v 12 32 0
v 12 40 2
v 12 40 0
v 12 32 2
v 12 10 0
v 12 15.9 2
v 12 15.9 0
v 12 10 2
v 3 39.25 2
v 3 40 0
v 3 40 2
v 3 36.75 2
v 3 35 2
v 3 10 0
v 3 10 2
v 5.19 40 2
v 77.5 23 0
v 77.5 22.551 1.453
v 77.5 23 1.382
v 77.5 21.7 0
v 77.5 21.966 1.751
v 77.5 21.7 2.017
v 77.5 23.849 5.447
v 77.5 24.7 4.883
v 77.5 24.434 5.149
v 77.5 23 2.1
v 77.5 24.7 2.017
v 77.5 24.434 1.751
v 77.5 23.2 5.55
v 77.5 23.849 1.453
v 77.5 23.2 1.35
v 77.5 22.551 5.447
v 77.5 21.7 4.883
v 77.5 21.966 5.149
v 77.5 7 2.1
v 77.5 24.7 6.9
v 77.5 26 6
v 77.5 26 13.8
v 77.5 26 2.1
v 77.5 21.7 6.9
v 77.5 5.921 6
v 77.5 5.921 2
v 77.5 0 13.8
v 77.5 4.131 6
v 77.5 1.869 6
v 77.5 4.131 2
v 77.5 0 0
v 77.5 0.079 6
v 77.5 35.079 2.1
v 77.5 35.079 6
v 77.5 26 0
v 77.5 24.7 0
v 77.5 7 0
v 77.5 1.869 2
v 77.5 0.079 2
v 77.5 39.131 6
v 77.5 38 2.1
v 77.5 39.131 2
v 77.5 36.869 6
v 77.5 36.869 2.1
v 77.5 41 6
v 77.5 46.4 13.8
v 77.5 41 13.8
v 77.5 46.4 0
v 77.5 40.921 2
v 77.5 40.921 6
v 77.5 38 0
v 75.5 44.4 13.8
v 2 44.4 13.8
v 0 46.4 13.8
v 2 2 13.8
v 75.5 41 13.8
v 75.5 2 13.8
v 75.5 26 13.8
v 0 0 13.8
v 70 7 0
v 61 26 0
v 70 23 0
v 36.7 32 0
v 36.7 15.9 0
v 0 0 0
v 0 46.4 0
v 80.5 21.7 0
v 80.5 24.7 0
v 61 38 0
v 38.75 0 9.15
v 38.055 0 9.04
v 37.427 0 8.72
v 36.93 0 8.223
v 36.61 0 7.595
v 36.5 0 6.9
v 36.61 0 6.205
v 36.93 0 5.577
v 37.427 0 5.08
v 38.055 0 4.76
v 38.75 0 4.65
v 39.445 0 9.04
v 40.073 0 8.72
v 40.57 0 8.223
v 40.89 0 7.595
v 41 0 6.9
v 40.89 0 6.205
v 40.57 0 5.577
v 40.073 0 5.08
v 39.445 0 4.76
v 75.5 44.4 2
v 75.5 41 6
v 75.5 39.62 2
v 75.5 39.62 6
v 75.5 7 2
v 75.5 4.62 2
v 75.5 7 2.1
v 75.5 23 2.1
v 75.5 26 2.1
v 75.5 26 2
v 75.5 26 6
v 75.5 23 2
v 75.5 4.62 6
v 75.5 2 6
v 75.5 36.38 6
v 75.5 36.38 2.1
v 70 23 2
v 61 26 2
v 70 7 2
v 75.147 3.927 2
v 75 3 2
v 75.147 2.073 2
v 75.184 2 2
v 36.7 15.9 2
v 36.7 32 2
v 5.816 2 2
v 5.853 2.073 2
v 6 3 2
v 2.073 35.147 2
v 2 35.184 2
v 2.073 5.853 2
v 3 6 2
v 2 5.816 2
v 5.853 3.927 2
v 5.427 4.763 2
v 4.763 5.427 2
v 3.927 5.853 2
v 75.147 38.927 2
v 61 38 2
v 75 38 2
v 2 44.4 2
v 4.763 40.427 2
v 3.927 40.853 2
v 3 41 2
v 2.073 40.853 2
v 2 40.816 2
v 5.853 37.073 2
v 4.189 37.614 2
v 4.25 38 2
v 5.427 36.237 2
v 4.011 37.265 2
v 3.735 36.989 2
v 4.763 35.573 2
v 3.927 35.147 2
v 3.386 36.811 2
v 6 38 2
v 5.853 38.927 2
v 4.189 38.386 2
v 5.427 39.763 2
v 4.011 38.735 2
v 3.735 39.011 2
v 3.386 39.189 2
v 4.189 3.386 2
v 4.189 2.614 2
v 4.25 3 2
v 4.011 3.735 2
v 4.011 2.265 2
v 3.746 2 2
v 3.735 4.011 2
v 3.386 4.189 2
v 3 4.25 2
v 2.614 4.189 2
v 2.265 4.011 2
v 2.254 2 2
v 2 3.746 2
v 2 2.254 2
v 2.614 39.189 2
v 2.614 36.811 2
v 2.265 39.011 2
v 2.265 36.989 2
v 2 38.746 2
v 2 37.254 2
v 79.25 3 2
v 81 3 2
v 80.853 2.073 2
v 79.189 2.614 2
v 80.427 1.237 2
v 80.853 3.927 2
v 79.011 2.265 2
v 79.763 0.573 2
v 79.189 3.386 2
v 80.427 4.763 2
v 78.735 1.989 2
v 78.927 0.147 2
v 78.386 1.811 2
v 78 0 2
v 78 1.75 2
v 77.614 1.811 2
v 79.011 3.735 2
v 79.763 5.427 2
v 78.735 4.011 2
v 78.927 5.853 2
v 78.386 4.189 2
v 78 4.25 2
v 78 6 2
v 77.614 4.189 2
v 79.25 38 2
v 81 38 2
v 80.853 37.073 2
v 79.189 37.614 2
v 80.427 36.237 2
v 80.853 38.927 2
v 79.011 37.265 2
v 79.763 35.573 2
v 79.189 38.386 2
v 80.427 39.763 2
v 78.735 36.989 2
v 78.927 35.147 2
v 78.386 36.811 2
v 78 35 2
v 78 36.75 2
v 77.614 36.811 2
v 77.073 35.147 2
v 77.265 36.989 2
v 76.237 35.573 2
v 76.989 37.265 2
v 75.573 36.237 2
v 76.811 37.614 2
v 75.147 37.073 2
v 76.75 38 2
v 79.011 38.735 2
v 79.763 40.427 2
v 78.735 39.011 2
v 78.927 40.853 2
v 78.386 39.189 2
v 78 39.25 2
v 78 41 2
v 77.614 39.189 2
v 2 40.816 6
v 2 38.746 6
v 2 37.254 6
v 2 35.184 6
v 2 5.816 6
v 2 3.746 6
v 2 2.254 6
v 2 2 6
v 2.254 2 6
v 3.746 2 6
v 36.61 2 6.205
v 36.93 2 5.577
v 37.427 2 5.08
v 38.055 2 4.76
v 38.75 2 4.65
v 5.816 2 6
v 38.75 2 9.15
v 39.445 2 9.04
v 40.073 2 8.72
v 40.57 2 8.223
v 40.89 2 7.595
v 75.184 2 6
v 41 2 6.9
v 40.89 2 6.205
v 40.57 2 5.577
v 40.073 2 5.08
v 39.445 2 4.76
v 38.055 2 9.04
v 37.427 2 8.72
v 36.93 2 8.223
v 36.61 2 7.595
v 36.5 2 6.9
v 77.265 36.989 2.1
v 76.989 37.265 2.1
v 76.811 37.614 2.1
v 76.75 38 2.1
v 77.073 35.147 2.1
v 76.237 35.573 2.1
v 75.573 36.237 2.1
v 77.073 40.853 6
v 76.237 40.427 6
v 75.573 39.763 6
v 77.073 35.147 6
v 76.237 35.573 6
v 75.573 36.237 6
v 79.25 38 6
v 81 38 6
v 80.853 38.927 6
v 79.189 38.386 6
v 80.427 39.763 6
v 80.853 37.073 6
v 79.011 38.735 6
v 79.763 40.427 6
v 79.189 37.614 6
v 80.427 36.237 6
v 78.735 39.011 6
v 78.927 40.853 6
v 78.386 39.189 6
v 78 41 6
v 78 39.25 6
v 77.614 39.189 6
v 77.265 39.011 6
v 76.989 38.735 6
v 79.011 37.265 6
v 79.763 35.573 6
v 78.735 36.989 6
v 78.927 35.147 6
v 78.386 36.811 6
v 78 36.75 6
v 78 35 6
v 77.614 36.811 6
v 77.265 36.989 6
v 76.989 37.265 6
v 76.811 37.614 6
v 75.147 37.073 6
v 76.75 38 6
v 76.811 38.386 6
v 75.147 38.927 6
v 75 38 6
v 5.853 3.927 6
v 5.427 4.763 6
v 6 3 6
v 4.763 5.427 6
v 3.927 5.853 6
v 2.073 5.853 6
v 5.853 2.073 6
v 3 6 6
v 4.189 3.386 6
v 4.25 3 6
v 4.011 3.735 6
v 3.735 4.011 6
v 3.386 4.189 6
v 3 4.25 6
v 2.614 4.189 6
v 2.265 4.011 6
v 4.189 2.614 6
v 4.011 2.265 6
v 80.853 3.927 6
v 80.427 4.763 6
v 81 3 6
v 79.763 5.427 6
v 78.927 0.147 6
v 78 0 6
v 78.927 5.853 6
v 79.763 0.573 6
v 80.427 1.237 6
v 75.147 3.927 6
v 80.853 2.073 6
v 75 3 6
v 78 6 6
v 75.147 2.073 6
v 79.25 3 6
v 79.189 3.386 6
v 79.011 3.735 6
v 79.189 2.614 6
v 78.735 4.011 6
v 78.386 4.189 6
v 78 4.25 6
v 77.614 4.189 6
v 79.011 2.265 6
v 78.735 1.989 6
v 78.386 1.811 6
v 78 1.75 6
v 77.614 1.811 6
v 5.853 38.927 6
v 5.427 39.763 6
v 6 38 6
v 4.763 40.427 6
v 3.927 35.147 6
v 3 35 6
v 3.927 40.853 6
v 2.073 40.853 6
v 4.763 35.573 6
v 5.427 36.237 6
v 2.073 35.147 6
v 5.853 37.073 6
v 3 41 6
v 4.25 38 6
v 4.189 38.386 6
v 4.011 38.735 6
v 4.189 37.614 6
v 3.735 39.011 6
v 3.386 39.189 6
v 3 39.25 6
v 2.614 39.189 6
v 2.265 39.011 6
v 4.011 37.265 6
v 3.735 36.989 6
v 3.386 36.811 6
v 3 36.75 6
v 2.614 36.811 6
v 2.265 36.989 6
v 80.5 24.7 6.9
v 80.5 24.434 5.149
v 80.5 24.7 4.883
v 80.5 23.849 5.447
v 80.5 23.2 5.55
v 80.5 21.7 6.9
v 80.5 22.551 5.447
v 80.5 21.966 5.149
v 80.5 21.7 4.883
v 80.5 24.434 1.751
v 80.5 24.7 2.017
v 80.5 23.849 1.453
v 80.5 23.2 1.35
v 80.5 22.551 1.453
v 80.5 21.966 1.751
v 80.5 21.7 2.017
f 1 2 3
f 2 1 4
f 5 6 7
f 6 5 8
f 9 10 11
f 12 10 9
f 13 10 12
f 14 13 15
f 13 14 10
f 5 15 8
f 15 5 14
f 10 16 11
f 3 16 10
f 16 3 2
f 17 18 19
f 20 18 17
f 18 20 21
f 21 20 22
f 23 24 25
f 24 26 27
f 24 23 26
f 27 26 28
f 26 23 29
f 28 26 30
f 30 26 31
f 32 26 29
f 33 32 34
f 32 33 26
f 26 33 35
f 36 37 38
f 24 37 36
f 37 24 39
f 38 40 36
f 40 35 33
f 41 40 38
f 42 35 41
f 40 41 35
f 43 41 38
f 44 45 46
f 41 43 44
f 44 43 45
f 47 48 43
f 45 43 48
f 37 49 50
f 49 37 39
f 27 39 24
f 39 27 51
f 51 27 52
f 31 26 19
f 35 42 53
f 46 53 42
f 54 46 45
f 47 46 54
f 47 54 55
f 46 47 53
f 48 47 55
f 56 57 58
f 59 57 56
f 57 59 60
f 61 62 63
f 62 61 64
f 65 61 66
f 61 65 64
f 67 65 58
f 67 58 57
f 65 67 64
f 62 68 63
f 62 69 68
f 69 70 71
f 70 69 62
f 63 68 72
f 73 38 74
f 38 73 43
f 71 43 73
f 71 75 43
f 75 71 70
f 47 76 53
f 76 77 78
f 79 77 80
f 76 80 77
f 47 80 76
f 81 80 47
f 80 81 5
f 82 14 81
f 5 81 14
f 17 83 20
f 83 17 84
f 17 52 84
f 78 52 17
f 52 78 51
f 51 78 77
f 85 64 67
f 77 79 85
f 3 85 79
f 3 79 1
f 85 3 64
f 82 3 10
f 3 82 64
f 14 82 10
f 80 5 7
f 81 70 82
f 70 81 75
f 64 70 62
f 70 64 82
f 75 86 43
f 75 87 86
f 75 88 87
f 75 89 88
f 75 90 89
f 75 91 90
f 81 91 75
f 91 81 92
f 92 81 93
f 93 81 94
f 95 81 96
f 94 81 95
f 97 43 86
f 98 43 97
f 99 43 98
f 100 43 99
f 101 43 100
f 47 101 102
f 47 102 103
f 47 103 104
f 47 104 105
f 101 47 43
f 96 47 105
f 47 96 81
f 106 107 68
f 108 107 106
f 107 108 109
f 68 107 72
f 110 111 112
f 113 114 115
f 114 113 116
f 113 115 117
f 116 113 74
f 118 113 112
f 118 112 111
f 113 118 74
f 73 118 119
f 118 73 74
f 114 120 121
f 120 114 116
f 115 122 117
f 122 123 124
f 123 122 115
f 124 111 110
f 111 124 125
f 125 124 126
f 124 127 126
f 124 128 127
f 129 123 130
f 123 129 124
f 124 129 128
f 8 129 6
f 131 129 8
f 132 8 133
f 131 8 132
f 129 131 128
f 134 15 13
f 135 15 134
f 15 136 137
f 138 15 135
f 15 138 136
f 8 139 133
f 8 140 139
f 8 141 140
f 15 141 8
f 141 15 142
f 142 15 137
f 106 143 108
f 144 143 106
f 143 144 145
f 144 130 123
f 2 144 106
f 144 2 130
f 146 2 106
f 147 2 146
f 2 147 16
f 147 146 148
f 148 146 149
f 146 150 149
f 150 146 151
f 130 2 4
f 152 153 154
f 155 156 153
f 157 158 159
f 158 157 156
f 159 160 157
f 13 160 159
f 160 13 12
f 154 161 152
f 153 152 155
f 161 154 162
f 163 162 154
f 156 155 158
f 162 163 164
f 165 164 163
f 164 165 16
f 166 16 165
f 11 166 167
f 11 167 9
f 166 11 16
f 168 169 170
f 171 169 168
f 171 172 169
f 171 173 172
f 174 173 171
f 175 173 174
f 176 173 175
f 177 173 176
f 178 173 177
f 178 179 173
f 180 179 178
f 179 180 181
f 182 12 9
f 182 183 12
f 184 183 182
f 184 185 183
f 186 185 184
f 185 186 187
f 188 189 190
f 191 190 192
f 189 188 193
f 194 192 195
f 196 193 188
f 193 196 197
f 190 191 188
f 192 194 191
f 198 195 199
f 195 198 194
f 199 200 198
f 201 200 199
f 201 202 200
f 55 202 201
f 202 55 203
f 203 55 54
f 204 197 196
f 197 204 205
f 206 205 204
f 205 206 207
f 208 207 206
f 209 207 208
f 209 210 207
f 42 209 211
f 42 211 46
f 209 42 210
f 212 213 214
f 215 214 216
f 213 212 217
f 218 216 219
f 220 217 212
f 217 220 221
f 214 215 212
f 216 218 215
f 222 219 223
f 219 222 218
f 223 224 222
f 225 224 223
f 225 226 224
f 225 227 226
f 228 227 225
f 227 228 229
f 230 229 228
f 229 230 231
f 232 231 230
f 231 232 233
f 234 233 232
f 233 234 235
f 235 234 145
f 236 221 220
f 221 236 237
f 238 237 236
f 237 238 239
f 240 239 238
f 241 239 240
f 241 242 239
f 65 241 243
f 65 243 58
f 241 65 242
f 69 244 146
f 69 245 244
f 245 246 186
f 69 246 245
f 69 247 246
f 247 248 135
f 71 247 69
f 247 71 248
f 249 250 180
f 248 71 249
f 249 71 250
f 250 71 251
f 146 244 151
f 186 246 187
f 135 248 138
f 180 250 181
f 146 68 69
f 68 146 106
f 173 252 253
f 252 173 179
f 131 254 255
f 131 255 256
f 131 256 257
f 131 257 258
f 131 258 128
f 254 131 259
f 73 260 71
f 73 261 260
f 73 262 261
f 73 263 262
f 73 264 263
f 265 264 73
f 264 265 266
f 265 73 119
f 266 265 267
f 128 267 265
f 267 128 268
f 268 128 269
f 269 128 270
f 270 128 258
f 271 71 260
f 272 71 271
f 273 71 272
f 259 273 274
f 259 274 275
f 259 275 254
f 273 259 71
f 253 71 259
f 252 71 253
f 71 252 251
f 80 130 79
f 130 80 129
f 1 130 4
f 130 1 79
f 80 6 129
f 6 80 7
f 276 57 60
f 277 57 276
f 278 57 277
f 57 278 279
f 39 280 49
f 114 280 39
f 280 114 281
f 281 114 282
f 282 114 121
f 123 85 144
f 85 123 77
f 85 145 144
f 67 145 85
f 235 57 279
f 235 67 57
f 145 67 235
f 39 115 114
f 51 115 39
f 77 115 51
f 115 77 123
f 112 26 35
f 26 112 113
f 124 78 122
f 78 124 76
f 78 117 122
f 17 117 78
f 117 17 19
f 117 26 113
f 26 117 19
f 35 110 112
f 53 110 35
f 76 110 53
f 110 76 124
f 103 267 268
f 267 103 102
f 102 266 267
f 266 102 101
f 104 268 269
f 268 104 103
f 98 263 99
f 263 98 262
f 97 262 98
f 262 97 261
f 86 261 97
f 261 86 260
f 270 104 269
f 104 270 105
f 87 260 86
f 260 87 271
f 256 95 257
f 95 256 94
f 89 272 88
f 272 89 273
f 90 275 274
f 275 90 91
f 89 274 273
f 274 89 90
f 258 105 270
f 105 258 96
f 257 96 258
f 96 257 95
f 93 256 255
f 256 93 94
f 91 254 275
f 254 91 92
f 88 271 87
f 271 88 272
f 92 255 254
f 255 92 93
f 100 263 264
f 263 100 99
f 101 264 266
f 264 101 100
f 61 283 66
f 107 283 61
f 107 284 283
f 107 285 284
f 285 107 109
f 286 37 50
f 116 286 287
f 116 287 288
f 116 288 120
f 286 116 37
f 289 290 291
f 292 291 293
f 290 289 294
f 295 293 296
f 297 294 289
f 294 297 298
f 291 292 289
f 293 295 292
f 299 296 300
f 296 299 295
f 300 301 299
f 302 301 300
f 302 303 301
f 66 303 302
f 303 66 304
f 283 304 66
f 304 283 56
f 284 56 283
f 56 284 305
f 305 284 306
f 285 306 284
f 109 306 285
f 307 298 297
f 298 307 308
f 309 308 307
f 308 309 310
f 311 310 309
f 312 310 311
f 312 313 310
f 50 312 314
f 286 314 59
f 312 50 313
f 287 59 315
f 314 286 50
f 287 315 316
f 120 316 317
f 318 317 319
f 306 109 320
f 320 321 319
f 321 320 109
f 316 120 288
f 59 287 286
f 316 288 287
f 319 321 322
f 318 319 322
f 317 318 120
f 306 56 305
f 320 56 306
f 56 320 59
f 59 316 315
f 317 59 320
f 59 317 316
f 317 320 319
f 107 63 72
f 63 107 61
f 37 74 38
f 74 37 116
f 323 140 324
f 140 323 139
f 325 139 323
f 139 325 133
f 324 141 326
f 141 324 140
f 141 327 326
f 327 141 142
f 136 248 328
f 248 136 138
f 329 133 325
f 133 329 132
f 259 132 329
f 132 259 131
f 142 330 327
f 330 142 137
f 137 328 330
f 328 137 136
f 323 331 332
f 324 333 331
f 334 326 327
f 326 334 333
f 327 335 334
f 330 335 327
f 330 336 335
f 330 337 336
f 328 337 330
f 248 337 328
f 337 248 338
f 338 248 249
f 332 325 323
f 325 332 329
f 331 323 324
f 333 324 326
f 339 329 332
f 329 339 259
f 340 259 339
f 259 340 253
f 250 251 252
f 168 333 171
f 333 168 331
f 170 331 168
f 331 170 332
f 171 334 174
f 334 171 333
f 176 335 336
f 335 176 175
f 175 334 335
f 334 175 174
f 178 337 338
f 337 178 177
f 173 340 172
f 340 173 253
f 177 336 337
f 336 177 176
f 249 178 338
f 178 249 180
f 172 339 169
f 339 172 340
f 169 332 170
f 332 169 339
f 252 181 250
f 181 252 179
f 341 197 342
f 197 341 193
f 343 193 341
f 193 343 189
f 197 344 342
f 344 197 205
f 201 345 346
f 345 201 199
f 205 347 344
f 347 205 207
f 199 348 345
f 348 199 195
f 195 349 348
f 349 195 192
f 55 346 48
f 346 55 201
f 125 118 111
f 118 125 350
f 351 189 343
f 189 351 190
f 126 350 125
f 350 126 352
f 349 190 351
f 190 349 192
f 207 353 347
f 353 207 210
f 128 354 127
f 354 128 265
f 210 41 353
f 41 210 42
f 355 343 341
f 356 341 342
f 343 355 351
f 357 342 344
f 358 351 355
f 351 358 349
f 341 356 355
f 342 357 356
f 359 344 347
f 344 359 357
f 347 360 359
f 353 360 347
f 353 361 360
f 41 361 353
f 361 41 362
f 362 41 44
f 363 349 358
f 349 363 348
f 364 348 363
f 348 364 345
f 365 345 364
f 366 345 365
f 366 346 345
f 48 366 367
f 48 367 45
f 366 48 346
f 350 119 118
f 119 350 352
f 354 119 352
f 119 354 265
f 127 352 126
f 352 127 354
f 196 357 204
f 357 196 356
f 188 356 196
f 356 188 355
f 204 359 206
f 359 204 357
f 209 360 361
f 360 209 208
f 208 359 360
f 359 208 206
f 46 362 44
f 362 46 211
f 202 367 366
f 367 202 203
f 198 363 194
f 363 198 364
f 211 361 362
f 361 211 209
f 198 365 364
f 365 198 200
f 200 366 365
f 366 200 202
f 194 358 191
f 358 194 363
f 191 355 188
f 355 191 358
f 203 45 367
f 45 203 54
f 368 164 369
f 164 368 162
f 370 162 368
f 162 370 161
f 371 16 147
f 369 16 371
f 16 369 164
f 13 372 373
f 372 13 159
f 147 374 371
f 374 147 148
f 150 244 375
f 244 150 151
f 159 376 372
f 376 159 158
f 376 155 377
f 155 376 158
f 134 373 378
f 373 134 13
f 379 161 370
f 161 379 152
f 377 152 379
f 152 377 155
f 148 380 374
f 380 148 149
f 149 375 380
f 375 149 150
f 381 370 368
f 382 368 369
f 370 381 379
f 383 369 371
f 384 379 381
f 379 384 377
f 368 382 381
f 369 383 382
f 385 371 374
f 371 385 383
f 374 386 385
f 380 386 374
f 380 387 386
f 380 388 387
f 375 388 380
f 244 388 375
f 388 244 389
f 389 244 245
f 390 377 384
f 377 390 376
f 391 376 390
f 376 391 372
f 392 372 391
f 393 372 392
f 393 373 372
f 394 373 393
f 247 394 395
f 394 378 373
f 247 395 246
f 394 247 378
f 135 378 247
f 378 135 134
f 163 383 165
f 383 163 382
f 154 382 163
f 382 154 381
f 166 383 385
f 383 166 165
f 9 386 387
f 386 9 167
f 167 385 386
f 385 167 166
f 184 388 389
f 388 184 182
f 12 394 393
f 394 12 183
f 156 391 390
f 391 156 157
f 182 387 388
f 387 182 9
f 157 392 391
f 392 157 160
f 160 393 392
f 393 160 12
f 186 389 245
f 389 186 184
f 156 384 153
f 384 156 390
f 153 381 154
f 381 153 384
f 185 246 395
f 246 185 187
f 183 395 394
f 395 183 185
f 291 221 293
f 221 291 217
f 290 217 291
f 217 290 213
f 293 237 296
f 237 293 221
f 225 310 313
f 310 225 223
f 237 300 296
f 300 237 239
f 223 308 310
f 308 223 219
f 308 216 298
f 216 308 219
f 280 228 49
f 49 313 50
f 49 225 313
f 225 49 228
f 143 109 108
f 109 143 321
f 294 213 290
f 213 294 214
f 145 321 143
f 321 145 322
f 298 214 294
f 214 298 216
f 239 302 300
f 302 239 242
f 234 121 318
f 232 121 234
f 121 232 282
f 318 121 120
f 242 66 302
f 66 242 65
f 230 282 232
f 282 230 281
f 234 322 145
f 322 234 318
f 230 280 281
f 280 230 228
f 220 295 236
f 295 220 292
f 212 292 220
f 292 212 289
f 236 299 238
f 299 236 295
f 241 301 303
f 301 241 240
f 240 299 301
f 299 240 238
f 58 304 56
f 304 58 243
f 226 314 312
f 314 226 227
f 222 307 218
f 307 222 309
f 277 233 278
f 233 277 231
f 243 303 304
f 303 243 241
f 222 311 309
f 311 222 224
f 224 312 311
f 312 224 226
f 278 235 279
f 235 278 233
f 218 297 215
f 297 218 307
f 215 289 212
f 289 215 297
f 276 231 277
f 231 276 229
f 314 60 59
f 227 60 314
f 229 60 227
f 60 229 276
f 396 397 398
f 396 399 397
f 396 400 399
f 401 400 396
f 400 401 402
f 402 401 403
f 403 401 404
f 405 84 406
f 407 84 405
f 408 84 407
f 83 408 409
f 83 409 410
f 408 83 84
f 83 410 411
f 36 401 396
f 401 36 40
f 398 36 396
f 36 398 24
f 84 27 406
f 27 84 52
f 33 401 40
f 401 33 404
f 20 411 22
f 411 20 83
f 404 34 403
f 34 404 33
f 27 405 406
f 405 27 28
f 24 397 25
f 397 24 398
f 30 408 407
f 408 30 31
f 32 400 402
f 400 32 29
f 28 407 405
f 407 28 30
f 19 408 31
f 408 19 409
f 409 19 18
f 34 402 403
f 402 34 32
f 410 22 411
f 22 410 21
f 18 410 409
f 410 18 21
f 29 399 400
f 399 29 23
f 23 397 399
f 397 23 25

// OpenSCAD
/*
 * Temperature Controller Box - Reverse Engineered from STL
 * 
 * Author: Colin Bitterfield
 * Email: colin@bitterfield.com  
 * Date Created: 2025-08-28
 * Date Updated: 2025-08-28
 * Version: 0.1.0
 *
 * Description: Reverse engineered from existing STL files:
 * - Front: 77.5×46.4×13.8mm
 * - Back: 76.8×63.6×6.9mm
 */

// ===== USER CONFIGURATION =====
component = 1; // 1=front_case, 2=back_case, 3=assembly

// ===== STL DIMENSIONS (reverse engineered) =====
front_length = 77.5;    // Front case length
front_width = 46.4;     // Front case width  
front_height = 13.8;    // Front case height

back_length = 76.8;     // Back case length
back_width = 63.6;      // Back case width
back_height = 6.9;      // Back case height

// ===== BOARD DIMENSIONS =====
board_length = 75;      // PCB length
board_width = 35;       // PCB width
board_thickness = 1.6;  // PCB thickness

// Display positioning (from your measurements)
display_width = 22.7;
display_height = 14.1;
display_offset_x = 10;
display_offset_y = 35 - 7 - 14.1;  // 7mm from top

// Connector dimensions
blue_connector_width = 15;
blue_connector_height = 10;
jst_connector_width = 7;
jst_connector_height = 8;

// ===== DESIGN PARAMETERS =====
wall_thickness = 2;
clearance = 1;
standoff_height = 4;
standoff_dia = 6;
screw_dia = 2.5;

// ===== MODULES =====

module front_case() {
    difference() {
        // Main body
        cube([front_length, front_width, front_height]);
        
        // Internal cavity
        translate([wall_thickness, wall_thickness, wall_thickness])
            cube([front_length - 2*wall_thickness, 
                  front_width - 2*wall_thickness, 
                  front_height]);
        
        // Display window cutout (positioned based on board layout)
        window_margin = 1;
        window_x = wall_thickness + clearance + display_offset_x - window_margin;
        window_y = wall_thickness + clearance + display_offset_y - window_margin;
        
        translate([window_x, window_y, -0.1])
            cube([display_width + 2*window_margin, 
                  display_height + 2*window_margin, 
                  wall_thickness + 0.2]);
        
        // Blue connector access (top)
        translate([wall_thickness + clearance + board_length - blue_connector_width - 2,
                   wall_thickness + clearance + board_width - 12,
                   -0.1])
            cube([blue_connector_width + 2, blue_connector_height + 2, wall_thickness + 0.2]);
        
        // JST connector access holes (4 connectors)
        // Left side connectors
        for(i = [0:2]) {
            translate([wall_thickness + clearance + 2 - 2,
                       wall_thickness + clearance + 8 + i*10 - 1,
                       -0.1])
                cube([jst_connector_width + 2, jst_connector_height + 2, wall_thickness + 0.2]);
        }
        
        // Right edge connector
        translate([wall_thickness + clearance + board_length - 8,
                   wall_thickness + clearance + 5 - 1,
                   -0.1])
            cube([jst_connector_width + 2, jst_connector_height + 8, wall_thickness + 0.2]);
        
        // Sensor cable hole (front)
        translate([front_length/2, -0.1, front_height/2])
            rotate([-90, 0, 0])
                cylinder(d=4.5, h=wall_thickness + 0.2, $fn=20);
        
        // Side access for blue connector
        translate([front_length - wall_thickness - 0.1, 
                   wall_thickness + clearance + board_width - 12,
                   wall_thickness + standoff_height])
            cube([wall_thickness + 0.2, blue_connector_width, blue_connector_height]);
    }
    
    // PCB standoffs (4 corners)
    translate([wall_thickness + clearance, wall_thickness + clearance, wall_thickness]) {
        standoff(0, 0);
        standoff(board_length, 0);
        standoff(0, board_width);
        standoff(board_length, board_width);
    }
    
    // Mounting tabs for rail integration
    tab_thickness = 3;
    translate([front_length, front_width/2 - tab_thickness/2, 0])
        difference() {
            cube([tab_thickness, tab_thickness, front_height/2]);
            translate([-0.1, tab_thickness/2, front_height/4])
                rotate([0, 90, 0])
                    cylinder(d=4.2, h=tab_thickness + 0.2, $fn=20);
        }
}

module standoff(x, y) {
    translate([x, y, 0]) {
        difference() {
            cylinder(d=standoff_dia, h=standoff_height, $fn=20);
            translate([0, 0, -0.1])
                cylinder(d=screw_dia, h=standoff_height + 0.2, $fn=20);
        }
    }
}

module back_case() {
    difference() {
        // Main back plate
        cube([back_length, back_width, back_height]);
        
        // Ventilation holes pattern
        vent_spacing = 6;
        vent_dia = 2;
        
        for (x = [vent_spacing : vent_spacing : back_length - vent_spacing]) {
            for (y = [vent_spacing : vent_spacing : back_width - vent_spacing]) {
                translate([x, y, -0.1])
                    cylinder(d=vent_dia, h=back_height + 0.2, $fn=10);
            }
        }
        
        // Corner screw holes
        corner_inset = 4;
        translate([corner_inset, corner_inset, -0.1])
            cylinder(d=2.5, h=back_height + 0.2, $fn=20);
        translate([back_length - corner_inset, corner_inset, -0.1])
            cylinder(d=2.5, h=back_height + 0.2, $fn=20);
        translate([corner_inset, back_width - corner_inset, -0.1])
            cylinder(d=2.5, h=back_height + 0.2, $fn=20);
        translate([back_length - corner_inset, back_width - corner_inset, -0.1])
            cylinder(d=2.5, h=back_height + 0.2, $fn=20);
    }
}

module assembly() {
    color("lightblue", 0.7) front_case();
    color("lightgreen", 0.7) translate([0, 0, front_height]) back_case();
}

// ===== MAIN EXECUTION =====
if (component == 1) {
    front_case();
    echo(str("Front case: ", front_length, "×", front_width, "×", front_height, "mm"));
} else if (component == 2) {
    back_case(); 
    echo(str("Back case: ", back_length, "×", back_width, "×", back_height, "mm"));
} else if (component == 3) {
    assembly();
    echo("Assembly view");
} else {
    echo("ERROR: Component must be 1 (front), 2 (back), or 3 (assembly)");
}
